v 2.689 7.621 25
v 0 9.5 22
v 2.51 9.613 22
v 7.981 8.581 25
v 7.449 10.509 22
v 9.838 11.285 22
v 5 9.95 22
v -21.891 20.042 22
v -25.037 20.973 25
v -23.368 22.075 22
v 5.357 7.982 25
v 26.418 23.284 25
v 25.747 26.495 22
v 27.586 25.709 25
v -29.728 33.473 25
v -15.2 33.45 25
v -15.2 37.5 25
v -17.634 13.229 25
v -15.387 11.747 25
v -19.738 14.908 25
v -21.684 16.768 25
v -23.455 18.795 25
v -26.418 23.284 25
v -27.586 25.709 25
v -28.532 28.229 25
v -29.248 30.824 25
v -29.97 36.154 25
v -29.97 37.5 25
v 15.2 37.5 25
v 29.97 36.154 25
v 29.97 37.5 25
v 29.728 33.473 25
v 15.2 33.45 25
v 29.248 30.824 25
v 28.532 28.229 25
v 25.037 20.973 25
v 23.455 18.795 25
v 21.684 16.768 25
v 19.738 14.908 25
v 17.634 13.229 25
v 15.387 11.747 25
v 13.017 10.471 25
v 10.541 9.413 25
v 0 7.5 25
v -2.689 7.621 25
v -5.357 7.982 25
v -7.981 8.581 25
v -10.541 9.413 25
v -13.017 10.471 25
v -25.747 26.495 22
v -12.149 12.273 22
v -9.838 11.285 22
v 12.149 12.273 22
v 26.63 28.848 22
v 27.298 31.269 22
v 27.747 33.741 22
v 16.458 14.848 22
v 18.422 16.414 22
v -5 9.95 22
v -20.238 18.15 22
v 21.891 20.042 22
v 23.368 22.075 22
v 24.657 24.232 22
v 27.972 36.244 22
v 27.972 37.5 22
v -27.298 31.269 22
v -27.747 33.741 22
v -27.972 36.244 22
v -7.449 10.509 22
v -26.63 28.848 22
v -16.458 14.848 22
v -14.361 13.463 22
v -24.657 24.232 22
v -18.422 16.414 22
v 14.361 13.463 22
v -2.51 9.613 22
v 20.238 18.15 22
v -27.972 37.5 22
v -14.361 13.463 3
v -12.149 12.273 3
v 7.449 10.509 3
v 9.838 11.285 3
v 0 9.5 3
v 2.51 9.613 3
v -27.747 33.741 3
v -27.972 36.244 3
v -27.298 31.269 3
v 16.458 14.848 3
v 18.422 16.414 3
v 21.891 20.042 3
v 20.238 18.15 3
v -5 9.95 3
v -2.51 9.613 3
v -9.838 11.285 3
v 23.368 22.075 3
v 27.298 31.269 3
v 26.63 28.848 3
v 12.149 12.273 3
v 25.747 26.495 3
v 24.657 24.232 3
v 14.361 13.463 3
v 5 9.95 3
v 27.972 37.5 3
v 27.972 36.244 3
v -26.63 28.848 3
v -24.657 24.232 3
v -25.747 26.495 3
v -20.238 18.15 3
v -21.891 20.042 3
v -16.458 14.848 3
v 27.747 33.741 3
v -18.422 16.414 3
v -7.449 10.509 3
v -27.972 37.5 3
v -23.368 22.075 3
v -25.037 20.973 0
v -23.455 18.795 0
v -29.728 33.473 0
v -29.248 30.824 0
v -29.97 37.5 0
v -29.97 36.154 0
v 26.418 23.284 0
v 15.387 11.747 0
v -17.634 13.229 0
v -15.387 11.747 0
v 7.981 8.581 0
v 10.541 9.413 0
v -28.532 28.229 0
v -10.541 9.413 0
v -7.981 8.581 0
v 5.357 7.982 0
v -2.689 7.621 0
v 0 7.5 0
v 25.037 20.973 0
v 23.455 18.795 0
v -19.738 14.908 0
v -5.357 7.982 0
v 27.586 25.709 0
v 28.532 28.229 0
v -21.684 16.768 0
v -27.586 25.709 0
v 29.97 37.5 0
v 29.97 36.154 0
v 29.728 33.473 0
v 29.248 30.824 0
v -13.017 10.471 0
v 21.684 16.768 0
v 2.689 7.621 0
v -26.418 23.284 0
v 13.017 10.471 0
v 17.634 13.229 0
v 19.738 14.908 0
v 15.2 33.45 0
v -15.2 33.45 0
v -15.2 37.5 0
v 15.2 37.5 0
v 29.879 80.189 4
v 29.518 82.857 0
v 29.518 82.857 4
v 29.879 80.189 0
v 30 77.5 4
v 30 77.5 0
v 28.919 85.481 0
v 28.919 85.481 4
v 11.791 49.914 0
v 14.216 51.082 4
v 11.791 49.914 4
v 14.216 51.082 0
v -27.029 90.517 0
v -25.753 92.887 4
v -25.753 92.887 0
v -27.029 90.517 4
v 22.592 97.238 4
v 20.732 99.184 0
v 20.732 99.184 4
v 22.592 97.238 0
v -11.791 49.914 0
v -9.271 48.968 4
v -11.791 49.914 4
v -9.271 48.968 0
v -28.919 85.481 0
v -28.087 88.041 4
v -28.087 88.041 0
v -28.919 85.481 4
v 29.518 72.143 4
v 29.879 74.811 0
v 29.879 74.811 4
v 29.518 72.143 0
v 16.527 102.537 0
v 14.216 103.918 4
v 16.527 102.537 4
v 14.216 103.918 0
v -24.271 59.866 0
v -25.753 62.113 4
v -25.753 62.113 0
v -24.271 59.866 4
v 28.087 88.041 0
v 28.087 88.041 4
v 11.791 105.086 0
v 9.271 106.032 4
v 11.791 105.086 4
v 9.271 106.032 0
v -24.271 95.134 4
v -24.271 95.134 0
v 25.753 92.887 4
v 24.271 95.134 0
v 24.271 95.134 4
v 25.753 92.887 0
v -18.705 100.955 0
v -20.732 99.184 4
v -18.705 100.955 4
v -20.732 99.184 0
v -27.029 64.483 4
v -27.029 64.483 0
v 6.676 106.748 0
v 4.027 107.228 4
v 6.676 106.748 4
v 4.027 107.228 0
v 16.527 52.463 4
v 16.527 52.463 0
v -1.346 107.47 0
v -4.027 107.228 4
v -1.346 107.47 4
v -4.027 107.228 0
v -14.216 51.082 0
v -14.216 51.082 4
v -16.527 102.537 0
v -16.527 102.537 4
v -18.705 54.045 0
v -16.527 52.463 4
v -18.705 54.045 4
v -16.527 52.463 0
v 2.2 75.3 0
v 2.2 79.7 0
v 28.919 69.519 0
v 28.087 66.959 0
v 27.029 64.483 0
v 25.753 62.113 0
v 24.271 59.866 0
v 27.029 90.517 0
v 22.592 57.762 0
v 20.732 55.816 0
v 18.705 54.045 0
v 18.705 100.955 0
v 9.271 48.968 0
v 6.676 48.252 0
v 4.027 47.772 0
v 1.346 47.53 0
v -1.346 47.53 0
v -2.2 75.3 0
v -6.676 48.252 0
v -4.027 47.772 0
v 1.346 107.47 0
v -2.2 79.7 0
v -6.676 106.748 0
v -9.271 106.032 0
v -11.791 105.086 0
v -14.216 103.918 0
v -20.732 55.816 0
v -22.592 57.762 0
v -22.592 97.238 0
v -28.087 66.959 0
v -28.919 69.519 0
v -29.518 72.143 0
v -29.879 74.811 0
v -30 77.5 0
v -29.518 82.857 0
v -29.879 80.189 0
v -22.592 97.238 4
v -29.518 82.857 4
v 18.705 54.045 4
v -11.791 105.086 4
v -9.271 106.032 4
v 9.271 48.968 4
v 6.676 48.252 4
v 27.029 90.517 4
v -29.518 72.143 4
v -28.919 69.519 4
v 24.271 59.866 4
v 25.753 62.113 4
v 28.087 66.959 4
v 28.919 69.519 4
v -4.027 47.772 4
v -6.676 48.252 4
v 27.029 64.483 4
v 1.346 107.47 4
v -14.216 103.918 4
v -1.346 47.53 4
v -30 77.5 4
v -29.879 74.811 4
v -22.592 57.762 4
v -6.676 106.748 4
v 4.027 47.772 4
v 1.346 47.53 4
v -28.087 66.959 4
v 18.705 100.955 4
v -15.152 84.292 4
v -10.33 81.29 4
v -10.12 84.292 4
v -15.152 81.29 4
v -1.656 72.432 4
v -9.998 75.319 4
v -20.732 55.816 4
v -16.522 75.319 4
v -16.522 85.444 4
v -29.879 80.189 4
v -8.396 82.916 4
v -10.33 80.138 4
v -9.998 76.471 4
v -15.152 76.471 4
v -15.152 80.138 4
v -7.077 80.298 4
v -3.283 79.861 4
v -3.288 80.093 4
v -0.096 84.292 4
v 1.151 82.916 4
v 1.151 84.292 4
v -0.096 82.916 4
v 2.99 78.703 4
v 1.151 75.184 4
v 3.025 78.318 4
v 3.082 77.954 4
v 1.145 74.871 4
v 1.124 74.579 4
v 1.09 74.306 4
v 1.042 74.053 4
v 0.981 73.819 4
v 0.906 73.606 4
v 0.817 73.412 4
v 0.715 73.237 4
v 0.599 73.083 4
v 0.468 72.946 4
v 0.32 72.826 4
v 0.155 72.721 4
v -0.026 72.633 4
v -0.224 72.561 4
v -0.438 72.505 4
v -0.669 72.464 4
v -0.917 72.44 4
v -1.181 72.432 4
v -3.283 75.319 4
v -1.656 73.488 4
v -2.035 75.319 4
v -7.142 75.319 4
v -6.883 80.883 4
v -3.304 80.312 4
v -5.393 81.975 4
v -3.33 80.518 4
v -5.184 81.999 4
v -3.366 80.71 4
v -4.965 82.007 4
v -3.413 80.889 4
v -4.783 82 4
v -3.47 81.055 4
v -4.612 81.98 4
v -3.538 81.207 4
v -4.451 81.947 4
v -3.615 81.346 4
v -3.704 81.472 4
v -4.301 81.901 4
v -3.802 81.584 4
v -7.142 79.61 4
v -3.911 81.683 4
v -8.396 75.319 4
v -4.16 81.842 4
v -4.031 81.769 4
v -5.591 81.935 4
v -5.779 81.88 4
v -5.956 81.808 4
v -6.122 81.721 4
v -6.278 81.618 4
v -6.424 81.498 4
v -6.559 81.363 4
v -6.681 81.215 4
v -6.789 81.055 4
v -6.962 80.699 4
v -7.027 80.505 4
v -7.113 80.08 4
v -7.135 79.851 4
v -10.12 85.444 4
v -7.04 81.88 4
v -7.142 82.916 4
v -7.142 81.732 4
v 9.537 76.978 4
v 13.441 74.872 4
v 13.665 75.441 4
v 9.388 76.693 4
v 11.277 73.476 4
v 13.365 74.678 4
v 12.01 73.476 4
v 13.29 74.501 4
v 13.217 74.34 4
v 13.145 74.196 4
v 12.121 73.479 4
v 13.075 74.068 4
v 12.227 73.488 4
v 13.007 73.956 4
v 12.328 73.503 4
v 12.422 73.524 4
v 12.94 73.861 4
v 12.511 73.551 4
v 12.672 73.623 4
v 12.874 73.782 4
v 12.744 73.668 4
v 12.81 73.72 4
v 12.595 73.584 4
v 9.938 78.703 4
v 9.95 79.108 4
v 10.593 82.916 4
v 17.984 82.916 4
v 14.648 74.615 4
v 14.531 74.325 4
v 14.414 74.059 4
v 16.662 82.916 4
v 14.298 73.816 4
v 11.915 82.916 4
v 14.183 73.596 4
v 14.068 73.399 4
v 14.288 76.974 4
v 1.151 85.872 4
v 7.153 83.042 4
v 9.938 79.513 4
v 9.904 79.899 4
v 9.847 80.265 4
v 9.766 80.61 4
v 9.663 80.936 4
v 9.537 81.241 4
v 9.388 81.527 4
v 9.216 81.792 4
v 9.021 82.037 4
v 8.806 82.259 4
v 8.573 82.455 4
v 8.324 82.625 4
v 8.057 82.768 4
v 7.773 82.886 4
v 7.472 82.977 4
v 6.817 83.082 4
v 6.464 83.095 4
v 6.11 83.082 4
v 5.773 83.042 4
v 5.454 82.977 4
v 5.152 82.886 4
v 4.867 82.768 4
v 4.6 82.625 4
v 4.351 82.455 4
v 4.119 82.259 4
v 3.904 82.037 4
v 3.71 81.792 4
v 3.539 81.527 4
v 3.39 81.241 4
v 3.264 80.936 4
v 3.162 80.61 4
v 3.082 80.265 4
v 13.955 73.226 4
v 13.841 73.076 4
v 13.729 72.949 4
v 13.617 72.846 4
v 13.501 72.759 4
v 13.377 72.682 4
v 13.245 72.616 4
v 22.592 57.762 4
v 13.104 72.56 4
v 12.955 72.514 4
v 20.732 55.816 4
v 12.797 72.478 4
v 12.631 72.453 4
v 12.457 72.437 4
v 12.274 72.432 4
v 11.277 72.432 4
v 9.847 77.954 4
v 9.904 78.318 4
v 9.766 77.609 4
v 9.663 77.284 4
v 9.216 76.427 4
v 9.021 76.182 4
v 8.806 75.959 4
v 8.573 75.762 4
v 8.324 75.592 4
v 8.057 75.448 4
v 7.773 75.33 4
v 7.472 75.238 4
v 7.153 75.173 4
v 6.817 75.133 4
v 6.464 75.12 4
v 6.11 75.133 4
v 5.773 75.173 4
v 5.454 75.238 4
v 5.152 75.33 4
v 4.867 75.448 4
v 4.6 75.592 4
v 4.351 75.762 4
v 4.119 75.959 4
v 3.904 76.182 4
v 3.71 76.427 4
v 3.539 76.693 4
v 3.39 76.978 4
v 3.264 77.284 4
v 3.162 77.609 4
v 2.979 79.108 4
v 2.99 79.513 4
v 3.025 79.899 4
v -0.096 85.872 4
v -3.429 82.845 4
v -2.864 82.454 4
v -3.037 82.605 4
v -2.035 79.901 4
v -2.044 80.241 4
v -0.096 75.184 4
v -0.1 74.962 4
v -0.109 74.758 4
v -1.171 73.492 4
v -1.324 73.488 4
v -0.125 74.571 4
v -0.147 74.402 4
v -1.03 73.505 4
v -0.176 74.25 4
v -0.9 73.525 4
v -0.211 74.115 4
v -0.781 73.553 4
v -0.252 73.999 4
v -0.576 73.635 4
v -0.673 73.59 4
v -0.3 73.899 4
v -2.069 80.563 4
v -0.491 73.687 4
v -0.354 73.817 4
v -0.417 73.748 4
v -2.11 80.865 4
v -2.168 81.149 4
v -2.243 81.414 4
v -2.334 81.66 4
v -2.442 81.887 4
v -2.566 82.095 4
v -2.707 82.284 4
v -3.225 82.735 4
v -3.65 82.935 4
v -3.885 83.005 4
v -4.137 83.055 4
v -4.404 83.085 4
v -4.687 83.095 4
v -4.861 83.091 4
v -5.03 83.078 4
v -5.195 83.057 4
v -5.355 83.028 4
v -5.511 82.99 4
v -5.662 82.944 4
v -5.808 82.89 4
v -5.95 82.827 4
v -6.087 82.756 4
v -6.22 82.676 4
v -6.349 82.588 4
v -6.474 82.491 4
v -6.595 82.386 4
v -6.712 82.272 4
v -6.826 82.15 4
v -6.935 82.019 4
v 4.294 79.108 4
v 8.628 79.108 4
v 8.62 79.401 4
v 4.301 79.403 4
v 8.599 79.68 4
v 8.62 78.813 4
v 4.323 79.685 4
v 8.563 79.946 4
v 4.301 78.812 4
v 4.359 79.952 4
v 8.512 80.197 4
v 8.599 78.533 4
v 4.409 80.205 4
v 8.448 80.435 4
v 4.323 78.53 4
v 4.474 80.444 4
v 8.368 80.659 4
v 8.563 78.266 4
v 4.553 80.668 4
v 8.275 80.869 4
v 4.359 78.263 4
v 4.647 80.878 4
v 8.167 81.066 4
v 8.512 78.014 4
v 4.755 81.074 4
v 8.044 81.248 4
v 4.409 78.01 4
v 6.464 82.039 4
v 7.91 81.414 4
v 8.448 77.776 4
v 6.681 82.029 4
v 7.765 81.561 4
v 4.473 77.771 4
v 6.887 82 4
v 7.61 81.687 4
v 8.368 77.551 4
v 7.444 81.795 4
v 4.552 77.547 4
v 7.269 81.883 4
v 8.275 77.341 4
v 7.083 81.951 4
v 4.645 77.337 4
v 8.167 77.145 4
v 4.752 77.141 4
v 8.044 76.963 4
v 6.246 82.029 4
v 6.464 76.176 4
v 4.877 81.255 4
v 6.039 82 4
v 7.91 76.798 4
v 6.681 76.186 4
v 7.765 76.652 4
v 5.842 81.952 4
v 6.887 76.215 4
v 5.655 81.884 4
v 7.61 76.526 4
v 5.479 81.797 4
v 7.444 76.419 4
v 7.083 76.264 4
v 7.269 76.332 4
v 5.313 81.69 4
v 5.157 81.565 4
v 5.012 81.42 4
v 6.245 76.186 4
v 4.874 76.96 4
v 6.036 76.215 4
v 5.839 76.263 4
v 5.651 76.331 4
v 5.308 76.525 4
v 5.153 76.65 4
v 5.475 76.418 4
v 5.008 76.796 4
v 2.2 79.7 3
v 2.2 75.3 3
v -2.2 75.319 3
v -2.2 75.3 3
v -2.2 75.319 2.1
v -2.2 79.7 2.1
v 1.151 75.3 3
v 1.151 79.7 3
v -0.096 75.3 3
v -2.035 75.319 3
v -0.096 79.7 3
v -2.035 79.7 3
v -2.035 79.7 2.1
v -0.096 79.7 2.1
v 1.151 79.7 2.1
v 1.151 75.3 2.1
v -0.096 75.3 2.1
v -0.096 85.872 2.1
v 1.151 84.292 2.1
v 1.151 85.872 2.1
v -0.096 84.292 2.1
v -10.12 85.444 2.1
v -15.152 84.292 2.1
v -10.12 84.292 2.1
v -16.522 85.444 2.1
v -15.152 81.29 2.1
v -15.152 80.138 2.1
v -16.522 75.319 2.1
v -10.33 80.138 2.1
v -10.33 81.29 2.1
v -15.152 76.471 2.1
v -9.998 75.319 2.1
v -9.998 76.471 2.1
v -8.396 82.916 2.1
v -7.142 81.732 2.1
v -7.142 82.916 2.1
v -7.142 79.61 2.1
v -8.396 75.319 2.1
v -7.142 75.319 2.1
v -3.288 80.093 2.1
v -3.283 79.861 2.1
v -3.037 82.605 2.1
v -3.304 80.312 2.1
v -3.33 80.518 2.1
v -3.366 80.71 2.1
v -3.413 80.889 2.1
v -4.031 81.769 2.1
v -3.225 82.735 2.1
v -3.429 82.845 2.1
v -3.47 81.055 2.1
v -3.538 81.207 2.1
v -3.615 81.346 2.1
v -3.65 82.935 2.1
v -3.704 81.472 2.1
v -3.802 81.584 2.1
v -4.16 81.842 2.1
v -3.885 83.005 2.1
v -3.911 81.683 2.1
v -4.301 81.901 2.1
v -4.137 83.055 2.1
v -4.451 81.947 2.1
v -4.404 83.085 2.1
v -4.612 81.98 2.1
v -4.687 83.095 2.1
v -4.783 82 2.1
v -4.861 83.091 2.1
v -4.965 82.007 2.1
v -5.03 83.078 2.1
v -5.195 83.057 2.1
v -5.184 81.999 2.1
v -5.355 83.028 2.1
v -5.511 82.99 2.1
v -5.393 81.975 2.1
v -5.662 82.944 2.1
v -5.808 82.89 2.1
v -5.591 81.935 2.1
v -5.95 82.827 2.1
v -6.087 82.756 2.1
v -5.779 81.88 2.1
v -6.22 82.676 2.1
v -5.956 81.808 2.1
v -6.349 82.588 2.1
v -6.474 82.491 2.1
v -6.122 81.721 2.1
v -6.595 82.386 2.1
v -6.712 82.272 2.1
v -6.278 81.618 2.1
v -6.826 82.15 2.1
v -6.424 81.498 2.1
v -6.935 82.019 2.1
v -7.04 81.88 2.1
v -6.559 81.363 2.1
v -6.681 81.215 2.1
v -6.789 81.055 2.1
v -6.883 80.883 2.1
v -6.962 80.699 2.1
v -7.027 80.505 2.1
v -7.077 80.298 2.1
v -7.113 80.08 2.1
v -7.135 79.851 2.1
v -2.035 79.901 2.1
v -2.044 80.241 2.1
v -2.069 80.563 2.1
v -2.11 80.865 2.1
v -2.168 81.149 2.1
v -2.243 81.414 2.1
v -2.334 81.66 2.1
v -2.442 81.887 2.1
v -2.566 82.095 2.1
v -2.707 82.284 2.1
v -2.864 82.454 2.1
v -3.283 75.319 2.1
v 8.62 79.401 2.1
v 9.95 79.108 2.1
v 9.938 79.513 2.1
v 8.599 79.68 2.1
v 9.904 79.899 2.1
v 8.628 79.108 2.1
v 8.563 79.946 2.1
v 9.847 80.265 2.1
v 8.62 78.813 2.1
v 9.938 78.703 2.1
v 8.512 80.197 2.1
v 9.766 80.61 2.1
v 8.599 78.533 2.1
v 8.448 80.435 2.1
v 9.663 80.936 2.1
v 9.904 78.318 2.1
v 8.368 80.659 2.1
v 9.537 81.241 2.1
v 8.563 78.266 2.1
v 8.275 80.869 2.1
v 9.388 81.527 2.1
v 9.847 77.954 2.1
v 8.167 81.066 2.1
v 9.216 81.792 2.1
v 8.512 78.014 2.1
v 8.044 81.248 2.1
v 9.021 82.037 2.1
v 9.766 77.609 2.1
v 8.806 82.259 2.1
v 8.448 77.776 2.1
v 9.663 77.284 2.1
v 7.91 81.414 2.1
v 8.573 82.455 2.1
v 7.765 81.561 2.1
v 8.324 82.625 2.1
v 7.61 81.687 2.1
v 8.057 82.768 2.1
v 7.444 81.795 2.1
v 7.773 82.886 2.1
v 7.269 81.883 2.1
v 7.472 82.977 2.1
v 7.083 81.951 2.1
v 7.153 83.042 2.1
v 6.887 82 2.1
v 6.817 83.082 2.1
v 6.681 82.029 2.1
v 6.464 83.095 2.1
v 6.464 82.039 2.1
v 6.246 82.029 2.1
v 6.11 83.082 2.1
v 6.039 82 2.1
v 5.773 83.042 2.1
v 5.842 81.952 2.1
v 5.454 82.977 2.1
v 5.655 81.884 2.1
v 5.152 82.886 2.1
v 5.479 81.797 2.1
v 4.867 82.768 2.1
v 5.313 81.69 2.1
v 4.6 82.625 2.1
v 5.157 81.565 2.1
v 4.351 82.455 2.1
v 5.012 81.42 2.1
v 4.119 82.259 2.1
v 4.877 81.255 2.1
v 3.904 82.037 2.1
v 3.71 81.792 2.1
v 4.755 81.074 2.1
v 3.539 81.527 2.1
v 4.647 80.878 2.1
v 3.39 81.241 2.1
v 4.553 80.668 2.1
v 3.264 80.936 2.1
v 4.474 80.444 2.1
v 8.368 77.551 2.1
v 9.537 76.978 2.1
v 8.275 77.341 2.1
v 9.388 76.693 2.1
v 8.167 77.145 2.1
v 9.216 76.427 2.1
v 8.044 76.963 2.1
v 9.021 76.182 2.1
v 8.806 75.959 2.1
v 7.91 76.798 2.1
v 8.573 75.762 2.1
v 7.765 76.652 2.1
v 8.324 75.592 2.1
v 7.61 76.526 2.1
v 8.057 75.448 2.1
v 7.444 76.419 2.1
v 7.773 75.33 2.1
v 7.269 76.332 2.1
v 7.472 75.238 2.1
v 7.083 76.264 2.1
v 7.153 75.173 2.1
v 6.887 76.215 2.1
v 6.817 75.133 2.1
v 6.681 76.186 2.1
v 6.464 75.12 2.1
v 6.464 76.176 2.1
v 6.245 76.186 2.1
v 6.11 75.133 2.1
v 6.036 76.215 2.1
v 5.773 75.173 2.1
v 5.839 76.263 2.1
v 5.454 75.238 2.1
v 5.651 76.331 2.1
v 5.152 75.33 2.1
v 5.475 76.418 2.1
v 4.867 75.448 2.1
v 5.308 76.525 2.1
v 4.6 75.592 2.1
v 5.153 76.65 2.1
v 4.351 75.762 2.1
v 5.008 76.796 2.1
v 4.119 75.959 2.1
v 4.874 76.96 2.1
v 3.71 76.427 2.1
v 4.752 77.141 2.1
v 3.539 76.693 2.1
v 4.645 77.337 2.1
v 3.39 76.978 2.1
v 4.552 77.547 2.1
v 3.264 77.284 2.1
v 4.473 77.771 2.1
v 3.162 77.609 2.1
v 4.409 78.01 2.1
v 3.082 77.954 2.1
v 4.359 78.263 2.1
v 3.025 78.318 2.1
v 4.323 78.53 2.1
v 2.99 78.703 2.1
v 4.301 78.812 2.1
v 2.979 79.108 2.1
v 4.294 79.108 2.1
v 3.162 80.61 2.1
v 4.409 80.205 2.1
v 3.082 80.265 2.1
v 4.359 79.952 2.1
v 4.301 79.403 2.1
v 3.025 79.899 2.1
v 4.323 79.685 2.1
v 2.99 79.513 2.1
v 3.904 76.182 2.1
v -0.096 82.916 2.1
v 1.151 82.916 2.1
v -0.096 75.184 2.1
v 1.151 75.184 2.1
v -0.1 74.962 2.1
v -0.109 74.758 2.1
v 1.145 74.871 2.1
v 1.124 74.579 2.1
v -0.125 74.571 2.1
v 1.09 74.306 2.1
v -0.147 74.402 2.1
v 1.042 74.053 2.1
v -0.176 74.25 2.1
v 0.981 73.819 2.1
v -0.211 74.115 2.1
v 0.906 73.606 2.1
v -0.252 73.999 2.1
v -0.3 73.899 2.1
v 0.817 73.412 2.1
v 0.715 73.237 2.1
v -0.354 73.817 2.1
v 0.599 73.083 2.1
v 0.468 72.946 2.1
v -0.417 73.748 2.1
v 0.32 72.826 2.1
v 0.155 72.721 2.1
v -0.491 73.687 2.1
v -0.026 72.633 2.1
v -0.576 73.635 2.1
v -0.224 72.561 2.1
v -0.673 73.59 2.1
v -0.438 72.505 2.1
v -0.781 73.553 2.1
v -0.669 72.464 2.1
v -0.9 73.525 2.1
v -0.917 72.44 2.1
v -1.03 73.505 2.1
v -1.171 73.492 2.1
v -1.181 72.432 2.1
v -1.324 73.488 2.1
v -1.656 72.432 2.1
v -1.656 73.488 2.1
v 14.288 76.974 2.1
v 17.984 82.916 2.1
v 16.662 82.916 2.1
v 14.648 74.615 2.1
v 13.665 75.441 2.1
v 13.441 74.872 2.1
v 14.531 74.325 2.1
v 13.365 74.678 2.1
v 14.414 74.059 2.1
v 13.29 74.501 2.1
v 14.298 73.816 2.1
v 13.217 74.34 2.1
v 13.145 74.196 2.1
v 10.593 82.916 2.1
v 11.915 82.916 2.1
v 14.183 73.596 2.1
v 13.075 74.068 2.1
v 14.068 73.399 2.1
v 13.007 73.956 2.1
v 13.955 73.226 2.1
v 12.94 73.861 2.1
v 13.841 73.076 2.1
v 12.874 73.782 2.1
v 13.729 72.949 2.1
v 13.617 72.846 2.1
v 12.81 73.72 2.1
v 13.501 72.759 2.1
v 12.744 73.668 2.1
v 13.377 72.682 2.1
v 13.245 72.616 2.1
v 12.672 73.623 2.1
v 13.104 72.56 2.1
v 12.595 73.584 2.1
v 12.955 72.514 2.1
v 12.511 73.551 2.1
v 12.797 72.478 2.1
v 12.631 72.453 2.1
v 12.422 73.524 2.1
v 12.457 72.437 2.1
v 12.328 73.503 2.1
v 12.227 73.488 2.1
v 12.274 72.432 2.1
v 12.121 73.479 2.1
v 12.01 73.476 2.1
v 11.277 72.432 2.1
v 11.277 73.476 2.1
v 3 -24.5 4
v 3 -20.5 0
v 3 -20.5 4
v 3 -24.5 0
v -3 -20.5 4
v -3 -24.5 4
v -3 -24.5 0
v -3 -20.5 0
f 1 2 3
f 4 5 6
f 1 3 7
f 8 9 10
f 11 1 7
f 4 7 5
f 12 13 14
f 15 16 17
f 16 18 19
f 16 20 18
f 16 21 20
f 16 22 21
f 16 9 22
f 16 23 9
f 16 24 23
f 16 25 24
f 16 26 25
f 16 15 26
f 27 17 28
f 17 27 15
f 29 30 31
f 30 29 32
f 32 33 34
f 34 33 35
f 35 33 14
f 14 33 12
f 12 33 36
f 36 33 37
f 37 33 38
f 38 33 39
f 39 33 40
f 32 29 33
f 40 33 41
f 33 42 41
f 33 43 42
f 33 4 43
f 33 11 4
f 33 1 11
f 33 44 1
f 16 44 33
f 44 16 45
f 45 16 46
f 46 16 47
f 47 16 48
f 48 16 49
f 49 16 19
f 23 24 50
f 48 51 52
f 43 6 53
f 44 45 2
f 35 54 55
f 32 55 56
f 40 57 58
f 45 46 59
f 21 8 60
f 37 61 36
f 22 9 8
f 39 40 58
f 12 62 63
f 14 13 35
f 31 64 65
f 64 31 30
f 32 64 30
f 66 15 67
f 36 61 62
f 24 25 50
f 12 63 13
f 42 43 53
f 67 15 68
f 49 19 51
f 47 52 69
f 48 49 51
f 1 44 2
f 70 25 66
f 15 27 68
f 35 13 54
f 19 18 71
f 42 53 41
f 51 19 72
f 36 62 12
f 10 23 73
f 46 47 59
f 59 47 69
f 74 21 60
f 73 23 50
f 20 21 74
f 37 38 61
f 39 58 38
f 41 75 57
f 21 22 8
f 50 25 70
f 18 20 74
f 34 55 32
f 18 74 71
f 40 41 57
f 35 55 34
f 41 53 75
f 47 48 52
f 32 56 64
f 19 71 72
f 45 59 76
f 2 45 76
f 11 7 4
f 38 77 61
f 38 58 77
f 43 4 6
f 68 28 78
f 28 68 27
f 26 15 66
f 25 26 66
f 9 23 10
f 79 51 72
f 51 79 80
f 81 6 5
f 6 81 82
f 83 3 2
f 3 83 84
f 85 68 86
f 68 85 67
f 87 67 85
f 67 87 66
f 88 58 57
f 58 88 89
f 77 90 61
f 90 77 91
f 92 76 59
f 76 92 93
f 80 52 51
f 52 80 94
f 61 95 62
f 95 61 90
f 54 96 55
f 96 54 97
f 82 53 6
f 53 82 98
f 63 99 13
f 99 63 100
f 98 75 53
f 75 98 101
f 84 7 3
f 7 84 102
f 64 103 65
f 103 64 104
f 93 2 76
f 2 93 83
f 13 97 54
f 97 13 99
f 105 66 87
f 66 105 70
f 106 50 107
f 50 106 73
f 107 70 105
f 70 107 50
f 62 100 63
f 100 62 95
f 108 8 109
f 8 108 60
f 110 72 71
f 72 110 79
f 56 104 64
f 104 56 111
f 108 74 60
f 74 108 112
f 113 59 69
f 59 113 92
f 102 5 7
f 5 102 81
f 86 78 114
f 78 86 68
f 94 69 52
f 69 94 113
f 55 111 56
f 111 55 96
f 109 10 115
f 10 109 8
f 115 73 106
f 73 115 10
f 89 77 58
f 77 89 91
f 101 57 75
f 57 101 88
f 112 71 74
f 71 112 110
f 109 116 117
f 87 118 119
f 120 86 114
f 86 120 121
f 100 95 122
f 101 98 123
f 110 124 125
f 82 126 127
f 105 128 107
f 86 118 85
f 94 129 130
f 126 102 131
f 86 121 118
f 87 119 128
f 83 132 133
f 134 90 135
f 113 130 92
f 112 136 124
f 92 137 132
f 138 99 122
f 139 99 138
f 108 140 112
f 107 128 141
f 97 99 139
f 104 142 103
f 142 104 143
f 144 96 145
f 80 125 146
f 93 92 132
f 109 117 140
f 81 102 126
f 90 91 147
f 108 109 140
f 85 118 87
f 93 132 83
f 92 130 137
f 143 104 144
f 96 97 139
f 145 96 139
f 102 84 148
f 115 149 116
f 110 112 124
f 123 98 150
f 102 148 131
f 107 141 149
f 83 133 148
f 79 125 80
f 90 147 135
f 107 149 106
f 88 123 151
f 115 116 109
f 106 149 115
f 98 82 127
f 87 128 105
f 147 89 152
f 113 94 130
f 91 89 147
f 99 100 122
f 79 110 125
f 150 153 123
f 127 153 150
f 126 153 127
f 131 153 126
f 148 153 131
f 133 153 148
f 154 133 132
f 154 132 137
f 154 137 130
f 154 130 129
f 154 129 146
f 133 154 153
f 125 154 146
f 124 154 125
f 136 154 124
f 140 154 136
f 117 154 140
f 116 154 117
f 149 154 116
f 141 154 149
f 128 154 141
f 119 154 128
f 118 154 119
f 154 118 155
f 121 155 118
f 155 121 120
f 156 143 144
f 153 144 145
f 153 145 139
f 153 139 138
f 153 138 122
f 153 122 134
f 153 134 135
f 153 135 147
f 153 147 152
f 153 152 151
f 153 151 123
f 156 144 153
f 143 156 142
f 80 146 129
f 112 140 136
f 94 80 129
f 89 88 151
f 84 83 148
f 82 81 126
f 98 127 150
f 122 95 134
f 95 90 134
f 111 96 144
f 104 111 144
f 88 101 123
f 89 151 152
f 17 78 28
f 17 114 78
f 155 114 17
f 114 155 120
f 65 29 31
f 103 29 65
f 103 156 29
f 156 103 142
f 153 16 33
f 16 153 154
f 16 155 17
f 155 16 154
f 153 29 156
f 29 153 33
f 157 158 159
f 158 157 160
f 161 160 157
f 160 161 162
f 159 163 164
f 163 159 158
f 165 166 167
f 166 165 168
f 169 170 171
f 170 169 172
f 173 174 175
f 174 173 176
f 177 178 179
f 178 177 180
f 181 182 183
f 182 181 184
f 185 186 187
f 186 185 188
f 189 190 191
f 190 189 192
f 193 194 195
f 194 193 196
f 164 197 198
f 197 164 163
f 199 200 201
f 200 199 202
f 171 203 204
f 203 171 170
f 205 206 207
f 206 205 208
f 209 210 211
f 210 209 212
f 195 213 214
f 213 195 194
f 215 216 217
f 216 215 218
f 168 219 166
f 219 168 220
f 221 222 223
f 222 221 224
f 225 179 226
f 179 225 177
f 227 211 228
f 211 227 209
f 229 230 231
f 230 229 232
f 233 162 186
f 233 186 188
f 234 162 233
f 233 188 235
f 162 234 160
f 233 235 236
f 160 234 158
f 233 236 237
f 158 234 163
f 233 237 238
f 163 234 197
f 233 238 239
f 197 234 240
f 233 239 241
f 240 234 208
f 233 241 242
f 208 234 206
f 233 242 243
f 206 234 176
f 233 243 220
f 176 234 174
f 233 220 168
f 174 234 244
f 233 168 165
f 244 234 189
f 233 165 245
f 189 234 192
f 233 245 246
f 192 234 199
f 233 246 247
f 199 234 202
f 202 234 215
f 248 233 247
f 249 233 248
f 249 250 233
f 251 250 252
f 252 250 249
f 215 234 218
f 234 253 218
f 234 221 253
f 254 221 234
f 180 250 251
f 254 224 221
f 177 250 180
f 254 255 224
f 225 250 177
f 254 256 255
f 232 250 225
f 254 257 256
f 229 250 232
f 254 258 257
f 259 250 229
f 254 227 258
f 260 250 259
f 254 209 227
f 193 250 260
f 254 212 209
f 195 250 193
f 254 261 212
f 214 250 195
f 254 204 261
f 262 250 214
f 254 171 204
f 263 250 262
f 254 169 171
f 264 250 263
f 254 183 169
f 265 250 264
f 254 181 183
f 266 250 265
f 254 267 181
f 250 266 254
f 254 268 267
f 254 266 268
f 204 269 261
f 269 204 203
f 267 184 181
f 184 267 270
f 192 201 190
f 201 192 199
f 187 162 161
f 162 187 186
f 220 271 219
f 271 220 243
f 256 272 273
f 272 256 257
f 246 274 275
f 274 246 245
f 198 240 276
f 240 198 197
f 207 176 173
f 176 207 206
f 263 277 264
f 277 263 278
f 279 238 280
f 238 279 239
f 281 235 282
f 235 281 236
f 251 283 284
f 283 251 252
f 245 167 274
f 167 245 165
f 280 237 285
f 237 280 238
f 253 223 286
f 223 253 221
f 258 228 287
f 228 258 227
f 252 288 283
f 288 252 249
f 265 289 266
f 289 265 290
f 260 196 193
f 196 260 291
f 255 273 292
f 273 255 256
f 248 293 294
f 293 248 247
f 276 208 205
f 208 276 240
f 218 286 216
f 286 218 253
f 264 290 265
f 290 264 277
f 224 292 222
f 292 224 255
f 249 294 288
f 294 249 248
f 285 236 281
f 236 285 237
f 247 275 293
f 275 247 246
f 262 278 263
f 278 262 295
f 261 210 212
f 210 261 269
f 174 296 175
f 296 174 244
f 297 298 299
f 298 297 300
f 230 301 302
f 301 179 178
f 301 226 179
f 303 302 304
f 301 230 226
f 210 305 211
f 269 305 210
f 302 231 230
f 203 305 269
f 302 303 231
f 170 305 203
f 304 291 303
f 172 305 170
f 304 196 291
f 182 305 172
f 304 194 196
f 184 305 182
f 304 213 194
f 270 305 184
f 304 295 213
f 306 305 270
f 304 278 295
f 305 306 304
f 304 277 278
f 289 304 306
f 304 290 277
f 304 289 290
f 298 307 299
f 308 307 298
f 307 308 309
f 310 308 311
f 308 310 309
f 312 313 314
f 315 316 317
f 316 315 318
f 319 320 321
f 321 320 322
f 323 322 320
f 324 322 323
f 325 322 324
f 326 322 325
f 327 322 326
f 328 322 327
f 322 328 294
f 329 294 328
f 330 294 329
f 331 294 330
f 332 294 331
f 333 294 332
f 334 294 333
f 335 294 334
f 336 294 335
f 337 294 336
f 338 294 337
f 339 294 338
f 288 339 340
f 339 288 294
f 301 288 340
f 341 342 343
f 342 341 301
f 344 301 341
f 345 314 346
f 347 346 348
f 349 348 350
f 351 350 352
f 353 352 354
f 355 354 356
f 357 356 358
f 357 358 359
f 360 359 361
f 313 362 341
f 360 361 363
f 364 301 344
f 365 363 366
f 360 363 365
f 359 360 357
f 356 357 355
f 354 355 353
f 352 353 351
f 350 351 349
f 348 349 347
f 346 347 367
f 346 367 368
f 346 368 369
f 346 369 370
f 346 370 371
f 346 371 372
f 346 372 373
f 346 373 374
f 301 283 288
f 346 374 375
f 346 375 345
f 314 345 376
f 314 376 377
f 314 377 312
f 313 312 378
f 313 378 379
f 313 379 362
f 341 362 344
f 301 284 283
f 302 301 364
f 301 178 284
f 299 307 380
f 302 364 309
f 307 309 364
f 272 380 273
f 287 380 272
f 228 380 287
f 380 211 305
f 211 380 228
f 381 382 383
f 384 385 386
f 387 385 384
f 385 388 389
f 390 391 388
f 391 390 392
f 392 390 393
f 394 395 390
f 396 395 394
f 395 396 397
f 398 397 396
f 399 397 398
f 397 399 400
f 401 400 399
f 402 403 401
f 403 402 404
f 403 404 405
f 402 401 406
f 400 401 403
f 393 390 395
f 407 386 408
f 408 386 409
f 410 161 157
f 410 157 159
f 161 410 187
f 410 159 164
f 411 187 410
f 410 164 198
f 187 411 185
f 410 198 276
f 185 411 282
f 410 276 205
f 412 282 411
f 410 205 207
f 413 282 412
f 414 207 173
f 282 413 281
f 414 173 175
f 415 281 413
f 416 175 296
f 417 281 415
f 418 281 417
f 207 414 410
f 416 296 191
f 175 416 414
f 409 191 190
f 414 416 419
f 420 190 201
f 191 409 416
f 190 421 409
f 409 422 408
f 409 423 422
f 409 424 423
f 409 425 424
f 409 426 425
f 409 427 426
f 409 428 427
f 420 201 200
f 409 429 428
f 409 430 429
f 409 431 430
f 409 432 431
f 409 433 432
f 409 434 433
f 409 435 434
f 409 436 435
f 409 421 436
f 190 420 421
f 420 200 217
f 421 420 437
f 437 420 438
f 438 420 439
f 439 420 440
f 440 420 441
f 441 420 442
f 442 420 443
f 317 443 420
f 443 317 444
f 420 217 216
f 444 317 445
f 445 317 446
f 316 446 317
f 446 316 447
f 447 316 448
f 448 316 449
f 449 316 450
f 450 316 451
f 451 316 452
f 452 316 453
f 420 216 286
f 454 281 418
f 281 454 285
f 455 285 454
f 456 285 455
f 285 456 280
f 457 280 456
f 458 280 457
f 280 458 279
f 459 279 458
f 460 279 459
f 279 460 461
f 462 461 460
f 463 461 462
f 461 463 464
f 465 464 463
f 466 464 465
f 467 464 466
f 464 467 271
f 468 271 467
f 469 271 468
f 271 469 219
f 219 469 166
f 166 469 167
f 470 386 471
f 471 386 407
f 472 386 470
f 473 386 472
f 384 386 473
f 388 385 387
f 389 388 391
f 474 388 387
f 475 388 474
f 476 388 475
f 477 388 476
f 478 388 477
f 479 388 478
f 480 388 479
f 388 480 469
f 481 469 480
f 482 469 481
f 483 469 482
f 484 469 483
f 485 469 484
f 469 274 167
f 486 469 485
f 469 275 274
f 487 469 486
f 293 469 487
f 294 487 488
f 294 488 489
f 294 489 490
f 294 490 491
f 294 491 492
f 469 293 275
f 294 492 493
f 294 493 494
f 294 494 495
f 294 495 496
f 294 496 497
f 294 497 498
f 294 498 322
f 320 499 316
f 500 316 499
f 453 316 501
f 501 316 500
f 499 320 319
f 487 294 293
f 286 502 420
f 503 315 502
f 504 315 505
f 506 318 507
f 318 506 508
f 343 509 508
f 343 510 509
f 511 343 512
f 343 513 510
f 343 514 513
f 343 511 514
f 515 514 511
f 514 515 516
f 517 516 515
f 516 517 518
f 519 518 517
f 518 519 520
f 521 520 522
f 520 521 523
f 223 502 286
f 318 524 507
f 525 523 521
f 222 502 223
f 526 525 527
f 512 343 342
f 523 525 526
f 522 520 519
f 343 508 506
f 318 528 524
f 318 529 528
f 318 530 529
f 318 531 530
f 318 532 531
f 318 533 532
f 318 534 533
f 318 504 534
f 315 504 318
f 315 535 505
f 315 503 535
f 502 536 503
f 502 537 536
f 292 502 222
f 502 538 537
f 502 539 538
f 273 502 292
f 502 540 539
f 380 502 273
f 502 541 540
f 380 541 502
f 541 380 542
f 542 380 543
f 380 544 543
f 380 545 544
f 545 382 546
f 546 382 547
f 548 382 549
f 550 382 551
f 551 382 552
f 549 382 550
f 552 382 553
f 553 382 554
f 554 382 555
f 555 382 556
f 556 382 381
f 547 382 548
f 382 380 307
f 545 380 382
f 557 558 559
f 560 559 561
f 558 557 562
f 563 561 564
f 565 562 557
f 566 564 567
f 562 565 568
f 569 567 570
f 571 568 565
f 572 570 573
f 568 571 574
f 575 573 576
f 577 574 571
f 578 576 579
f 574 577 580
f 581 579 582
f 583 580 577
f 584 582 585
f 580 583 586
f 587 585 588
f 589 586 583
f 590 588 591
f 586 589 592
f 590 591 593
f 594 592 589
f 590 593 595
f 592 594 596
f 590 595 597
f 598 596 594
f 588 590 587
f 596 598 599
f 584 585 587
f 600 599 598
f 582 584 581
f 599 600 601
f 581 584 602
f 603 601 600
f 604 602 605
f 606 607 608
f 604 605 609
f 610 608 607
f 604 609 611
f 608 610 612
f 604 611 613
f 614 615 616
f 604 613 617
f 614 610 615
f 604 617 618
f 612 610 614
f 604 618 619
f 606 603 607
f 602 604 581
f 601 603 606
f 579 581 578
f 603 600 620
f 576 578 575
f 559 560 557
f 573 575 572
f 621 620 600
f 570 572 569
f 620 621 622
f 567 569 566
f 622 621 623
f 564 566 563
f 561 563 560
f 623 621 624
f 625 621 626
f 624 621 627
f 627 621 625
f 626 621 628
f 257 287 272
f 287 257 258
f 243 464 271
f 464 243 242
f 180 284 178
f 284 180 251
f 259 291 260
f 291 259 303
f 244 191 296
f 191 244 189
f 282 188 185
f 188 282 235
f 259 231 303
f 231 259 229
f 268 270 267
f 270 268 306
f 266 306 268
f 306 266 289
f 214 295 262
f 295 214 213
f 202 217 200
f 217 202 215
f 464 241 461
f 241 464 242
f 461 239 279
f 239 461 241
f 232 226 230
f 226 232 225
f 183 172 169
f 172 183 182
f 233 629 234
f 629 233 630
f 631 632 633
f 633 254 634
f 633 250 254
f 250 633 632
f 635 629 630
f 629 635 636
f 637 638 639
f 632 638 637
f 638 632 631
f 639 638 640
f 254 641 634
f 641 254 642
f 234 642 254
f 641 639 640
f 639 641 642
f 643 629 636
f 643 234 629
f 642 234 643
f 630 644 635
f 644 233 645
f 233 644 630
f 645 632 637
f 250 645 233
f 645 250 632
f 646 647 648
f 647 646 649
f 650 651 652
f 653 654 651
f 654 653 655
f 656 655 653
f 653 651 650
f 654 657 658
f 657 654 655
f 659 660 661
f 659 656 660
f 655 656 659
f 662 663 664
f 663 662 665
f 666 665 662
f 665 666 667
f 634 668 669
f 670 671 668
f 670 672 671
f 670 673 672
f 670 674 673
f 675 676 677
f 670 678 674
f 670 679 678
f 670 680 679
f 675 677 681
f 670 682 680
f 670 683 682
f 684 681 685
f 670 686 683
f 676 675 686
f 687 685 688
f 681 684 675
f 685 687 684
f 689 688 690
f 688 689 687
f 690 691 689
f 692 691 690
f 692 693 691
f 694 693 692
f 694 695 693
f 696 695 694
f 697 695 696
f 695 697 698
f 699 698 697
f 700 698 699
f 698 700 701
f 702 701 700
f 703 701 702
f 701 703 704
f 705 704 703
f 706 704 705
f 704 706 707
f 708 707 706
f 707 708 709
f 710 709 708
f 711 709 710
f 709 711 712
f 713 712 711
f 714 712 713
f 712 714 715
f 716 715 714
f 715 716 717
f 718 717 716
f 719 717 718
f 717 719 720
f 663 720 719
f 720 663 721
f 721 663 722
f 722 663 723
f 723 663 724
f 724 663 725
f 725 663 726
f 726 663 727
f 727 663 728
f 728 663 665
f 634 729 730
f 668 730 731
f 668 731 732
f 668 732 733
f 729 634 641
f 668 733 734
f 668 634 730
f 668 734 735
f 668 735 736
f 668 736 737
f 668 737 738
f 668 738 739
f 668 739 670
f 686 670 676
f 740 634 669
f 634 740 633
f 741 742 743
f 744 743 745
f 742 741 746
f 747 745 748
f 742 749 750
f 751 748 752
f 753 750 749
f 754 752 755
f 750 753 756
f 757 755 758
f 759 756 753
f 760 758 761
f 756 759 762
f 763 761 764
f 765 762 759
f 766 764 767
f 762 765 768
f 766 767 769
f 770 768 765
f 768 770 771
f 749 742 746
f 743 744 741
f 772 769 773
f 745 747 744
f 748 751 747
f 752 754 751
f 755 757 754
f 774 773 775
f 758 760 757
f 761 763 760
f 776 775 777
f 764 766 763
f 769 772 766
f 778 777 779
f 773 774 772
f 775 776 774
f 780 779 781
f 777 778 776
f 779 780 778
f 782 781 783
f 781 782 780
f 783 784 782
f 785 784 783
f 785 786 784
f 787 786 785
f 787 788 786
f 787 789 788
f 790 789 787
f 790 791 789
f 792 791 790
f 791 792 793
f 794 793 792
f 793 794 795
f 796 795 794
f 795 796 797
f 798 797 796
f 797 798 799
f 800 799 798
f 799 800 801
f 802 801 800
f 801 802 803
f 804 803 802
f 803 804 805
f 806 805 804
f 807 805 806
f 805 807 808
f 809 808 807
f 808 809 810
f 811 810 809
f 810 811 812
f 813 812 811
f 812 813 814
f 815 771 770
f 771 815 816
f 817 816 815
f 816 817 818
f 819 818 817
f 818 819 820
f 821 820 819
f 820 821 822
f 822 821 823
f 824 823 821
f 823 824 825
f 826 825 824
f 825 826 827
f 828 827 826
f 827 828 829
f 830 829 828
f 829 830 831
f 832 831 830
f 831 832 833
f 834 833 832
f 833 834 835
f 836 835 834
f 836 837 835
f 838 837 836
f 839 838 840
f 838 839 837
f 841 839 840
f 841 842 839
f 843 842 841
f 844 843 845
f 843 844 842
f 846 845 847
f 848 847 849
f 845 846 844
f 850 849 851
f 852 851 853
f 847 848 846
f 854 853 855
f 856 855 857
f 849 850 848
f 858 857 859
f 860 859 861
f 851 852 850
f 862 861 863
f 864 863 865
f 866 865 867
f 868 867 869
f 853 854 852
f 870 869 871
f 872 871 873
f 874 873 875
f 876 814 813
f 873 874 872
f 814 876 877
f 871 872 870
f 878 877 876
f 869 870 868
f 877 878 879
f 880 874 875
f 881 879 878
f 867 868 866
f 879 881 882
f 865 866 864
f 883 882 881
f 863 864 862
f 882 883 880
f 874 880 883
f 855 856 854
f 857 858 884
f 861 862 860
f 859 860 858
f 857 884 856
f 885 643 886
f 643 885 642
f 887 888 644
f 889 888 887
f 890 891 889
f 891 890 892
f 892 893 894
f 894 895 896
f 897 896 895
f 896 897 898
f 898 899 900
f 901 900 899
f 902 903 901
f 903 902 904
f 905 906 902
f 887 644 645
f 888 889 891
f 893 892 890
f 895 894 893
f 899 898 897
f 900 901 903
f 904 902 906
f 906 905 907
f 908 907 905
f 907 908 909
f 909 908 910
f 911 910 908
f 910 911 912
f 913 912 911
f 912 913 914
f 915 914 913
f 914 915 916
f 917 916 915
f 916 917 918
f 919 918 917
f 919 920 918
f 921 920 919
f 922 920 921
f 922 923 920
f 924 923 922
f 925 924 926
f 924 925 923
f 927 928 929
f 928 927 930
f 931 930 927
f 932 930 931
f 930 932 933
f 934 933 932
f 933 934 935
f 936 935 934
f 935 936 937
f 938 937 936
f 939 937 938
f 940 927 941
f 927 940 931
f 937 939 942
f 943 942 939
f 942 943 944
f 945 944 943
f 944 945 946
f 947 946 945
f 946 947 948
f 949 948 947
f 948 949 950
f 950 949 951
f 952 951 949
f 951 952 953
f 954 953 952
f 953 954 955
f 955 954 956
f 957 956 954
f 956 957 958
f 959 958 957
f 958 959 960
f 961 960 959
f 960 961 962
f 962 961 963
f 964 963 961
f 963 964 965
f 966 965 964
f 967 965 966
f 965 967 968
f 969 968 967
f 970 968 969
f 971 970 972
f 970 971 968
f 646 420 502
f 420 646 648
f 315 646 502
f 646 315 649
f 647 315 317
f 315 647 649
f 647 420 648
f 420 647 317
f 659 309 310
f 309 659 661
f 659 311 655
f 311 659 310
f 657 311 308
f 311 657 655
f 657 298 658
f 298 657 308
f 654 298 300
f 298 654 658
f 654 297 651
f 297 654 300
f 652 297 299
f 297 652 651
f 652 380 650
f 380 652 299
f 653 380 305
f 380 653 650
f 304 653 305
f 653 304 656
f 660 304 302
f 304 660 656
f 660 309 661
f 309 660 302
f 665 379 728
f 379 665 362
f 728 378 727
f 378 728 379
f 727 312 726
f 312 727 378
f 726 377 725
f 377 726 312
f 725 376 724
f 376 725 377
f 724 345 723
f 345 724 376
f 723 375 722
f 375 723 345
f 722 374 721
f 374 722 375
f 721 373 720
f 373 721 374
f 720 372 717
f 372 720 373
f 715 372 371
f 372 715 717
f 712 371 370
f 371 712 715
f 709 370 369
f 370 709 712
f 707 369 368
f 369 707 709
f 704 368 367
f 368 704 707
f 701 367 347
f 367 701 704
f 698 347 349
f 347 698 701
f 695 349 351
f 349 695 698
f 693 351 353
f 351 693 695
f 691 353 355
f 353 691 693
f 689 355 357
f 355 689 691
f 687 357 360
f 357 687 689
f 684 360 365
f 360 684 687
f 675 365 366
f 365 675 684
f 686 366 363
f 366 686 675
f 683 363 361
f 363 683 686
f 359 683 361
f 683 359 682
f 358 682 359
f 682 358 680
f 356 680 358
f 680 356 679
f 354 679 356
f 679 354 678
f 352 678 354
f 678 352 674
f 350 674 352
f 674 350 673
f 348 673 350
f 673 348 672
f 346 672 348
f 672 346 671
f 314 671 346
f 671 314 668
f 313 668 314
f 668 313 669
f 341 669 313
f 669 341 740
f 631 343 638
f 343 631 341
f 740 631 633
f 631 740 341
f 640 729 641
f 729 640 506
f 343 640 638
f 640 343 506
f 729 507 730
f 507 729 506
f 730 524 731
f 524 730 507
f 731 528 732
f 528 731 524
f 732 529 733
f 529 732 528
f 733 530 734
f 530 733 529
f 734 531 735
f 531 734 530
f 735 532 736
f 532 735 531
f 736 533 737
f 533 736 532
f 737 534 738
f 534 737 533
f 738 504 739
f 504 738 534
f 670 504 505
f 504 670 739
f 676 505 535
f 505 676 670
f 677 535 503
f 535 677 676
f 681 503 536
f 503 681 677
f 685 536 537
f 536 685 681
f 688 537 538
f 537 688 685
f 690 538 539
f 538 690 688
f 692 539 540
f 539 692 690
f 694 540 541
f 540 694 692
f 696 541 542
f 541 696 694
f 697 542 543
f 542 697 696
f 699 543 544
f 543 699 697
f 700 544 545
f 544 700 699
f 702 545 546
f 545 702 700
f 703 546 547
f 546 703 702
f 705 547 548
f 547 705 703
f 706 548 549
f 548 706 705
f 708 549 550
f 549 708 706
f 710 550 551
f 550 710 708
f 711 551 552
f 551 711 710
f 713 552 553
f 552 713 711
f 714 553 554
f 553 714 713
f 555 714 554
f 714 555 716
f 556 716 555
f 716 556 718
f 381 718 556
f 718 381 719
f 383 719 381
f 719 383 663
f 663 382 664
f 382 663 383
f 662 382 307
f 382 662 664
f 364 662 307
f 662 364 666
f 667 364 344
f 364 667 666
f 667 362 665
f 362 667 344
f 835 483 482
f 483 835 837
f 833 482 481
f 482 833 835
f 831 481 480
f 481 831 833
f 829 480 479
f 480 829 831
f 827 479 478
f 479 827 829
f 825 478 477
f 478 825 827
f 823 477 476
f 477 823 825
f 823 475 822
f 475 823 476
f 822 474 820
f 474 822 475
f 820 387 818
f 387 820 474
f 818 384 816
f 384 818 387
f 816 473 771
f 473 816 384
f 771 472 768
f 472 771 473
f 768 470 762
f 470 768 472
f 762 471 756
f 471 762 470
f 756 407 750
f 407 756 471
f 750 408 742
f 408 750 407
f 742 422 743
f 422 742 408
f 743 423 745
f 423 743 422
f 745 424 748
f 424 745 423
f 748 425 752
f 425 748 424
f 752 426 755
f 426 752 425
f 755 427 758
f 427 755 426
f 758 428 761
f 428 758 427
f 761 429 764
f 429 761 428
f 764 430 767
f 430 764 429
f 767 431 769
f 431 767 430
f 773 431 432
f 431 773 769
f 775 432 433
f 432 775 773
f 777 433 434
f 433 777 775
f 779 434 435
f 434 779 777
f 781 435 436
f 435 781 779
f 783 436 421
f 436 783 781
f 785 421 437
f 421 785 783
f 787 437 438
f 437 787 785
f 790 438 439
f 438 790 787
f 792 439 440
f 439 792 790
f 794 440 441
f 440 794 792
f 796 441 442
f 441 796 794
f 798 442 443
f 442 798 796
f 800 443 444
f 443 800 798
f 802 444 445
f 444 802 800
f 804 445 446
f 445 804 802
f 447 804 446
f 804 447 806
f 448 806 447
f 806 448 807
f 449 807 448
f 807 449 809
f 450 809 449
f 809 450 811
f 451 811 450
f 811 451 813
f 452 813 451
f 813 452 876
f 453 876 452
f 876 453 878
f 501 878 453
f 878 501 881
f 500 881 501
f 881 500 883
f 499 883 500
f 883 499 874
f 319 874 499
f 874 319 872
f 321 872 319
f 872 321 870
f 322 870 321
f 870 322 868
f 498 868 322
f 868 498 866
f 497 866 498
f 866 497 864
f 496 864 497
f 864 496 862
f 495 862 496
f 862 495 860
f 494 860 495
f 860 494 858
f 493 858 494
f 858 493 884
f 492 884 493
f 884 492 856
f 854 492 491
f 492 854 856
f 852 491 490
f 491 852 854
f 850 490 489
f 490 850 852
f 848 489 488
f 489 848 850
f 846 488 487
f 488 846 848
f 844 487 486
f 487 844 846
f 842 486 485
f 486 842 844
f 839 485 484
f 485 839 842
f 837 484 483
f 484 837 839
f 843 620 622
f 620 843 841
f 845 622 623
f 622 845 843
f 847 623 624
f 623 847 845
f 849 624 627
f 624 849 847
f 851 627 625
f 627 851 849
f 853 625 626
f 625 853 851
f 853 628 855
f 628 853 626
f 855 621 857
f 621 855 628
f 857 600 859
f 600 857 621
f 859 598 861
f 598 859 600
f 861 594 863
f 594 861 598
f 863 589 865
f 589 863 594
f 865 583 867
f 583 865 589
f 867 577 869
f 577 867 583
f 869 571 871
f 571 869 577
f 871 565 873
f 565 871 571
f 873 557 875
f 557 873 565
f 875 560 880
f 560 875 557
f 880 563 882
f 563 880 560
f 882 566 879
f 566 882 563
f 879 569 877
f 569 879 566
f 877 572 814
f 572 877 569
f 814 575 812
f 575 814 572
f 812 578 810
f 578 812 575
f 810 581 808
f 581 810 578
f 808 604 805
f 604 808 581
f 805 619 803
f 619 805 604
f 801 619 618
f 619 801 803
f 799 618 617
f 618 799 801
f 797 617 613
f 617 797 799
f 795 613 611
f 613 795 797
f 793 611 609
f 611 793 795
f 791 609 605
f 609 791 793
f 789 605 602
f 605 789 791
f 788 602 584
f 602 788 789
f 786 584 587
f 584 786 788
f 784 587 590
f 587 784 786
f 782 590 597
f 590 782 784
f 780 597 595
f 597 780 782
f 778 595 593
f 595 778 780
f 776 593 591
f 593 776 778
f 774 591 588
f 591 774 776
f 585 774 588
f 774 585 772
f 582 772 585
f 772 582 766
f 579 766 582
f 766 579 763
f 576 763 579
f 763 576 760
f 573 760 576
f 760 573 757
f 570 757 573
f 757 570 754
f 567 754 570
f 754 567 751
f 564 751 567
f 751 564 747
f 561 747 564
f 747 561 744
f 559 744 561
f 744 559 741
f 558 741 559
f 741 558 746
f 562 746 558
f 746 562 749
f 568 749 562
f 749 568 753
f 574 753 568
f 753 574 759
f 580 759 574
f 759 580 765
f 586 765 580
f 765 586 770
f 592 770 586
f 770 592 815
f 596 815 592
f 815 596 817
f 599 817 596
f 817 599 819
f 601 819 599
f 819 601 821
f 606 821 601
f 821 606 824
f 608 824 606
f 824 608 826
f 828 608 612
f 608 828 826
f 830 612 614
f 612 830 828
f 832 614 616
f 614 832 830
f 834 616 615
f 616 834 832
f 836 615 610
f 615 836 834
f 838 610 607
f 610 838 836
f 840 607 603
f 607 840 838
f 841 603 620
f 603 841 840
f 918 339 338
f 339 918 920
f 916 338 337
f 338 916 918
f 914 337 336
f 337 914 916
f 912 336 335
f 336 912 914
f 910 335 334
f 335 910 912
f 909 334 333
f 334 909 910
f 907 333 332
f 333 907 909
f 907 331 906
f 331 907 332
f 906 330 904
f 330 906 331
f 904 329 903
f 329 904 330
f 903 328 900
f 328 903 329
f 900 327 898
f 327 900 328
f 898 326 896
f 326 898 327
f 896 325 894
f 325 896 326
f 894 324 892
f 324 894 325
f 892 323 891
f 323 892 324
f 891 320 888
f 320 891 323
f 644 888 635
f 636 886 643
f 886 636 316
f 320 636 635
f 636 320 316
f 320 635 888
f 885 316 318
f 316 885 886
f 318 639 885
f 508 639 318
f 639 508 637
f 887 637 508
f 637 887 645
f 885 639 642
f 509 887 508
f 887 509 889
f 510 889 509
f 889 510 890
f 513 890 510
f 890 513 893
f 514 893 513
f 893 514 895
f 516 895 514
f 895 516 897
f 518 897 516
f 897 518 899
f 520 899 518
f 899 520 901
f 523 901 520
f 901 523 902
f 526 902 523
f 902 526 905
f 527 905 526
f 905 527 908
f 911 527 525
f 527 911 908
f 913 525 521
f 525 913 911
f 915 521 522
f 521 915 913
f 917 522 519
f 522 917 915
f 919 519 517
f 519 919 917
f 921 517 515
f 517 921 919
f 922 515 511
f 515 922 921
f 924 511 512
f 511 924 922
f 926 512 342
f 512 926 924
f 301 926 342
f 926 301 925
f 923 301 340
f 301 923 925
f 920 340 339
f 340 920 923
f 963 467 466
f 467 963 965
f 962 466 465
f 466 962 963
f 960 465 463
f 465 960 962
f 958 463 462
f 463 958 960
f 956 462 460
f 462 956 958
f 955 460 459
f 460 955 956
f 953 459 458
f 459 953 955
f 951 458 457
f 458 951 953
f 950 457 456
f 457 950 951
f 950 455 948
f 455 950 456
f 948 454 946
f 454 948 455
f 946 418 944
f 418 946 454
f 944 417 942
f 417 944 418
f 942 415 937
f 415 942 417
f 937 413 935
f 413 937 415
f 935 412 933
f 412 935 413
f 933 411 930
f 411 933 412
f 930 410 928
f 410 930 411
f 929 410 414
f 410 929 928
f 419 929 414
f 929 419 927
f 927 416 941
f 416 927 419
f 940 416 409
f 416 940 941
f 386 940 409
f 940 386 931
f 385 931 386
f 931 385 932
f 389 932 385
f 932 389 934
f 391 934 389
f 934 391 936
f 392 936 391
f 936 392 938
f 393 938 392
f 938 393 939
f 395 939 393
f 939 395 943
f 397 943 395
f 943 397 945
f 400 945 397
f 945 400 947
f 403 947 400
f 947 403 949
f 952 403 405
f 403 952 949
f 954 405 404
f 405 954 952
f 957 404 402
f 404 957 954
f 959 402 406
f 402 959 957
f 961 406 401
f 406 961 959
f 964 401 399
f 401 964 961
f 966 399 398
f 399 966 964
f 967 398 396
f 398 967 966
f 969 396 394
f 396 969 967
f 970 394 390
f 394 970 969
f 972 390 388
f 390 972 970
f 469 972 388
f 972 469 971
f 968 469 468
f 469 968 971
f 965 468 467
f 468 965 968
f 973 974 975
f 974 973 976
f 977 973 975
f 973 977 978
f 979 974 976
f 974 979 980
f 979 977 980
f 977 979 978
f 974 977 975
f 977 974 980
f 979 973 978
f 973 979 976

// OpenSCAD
/* 
* File : phholder_p2.scad (was: phone_holder_print2.scad)
* Author : witabix33  (https://github.com/witabix33)
* Description : A very simple phone headset holder that can be placed on a work position separator
*
* This is the main file to print WITHOUT holder frame
* File name has been shortened to help conversion to STL and GCOD that printers like being short
*
* Version 04 bld 28.04.2023
*/
include <phone_holder_parts.scad>


$fa = 1;
$fs = 0.4;
$fn = 70;  // resolution may be increased to have a better result
/* main_assemble module - final assembly
 * isTextEnabled : true => also print text
  * hasPin : true=> draw pins / false => draw holes
 */
module main_assemble(isTextEnabled=false, hasPin=false) {
    printDistance=15; // distance between parts
/**    
    // draw holder frame part
    rotate([0,90,0])
        translate([-default_holder_width/2,0,0])
            part_holder_frame();
**/        
    headphones_y_distance = printDistance*2.5;
    translate([0, headphones_y_distance, default_ph_width/2 ])
        rotate([00,0,90])
            part_headphones_holder();  // ! bug ! don't invoke hasPin param

    // draw add advertiser part with default_demo_separate distance
    advertiser_y_distance = headphones_y_distance + default_ph_width + printDistance;
    translate([0,advertiser_y_distance,default_holder_part_height/2 ])
        rotate([00, 00, 00])
        part_advertise(isTextEnabled=isTextEnabled, hasPin=hasPin);      
        
    // draw pins not within parts
    pin_y_distance=-default_holder_h1_length/2;
    if (! hasPin) {
        translate([0 ,pin_y_distance, +default_assembly_height/2 ])
            part_assembly_pin(aWidth=default_assembly_height*3/2); // pin for advertise support
                       
    }
}
 main_assemble(isTextEnabled=true, hasPin=false);
